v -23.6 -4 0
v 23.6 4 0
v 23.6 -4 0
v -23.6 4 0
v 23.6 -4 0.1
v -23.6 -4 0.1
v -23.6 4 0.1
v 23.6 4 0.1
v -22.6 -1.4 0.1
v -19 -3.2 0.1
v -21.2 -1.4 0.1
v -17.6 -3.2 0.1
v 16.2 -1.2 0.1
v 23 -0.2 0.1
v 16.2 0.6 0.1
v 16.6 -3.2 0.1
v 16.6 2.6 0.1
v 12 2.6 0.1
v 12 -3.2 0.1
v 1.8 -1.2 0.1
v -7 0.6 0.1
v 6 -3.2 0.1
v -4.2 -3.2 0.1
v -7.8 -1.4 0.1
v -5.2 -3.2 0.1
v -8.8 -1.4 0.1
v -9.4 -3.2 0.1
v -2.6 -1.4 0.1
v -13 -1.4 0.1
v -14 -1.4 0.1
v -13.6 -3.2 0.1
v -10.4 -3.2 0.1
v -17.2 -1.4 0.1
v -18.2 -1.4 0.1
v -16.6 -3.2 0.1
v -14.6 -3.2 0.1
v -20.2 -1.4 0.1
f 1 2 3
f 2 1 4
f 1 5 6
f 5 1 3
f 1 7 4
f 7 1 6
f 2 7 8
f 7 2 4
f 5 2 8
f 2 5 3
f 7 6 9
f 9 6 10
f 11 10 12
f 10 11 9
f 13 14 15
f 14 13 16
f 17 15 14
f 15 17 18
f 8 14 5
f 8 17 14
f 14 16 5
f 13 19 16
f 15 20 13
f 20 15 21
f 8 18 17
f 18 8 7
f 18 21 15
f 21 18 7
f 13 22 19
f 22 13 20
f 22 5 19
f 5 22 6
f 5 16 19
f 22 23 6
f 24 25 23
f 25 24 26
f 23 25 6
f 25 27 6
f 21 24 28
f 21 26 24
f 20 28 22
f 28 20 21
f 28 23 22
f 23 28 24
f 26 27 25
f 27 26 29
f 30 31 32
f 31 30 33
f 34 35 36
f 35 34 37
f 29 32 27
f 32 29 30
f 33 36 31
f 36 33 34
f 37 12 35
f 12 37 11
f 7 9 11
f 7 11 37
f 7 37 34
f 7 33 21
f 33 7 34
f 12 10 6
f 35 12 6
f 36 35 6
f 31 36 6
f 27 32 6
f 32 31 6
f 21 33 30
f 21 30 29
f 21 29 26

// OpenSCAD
// file: ../p/box5-12.scad
use <../lib.scad>
function ldraw_lib__box5_12() = [
// 0 Box with 5 Faces without Any Edges
// 0 Name: box5-12.dat
// 0 Author: Chris Dee [cwdee]
// 0 !LDRAW_ORG Primitive UPDATE 2009-02
// 0 !LICENSE Licensed under CC BY 4.0 : see CAreadme.txt
// 
// 0 BFC CERTIFY CCW
  [0,"BFC","CERTIFY"],
  [0,"BFC","CCW"],
// 
// 0 !HISTORY 2009-09-03 [PTadmin] Official Update 2009-02
// 
// 
// 4 16 1 1 1 1 1 -1 -1 1 -1 -1 1 1
  [4,16,1,1,1,1,1,-1,-1,1,-1,-1,1,1],
// 4 16 -1 0 1 1 0 1 1 1 1 -1 1 1
  [4,16,-1,0,1,1,0,1,1,1,1,-1,1,1],
// 4 16 -1 0 -1 -1 0 1 -1 1 1 -1 1 -1
  [4,16,-1,0,-1,-1,0,1,-1,1,1,-1,1,-1],
// 4 16 1 0 -1 -1 0 -1 -1 1 -1 1 1 -1
  [4,16,1,0,-1,-1,0,-1,-1,1,-1,1,1,-1],
// 4 16 1 0 1 1 0 -1 1 1 -1 1 1 1
  [4,16,1,0,1,1,0,-1,1,1,-1,1,1,1],
// 0
];
module ldraw_lib__box5_12(step=0, col=false, unit=2/5, alt=false, line=0.2, solid=!$preview)
    makepoly(ldraw_lib__box5_12(), step=step, col=col, unit=unit, alt=alt, line=line, solid=solid);
ldraw_lib__box5_12(line=0.2);
// main file
use <../lib.scad>
use <../p/box5-12.scad>
function ldraw_lib__4116878a() = [
// 0 Sticker  1 x  5.9 with White Arrow Right on Black Background
// 0 Name: 4116878a.dat
// 0 Author: Gerald Lasser [GeraldLasser]
// 0 !LDRAW_ORG Part UPDATE 2014-02
// 0 !LICENSE Licensed under CC BY 4.0 : see CAreadme.txt
// 
// 0 BFC CERTIFY CCW
  [0,"BFC","CERTIFY"],
  [0,"BFC","CCW"],
// 
// 0 !KEYWORDS Set 4533
// 
// 0 !HISTORY 2014-12-23 [PTadmin] Official Update 2014-02
// 
// 
// 1 16 0 -0.25 0 59 0 0 0 0.25 0 0 0 -10 box5-12.dat
  [1,16,0,-0.25,0,59,0,0,0,0.25,0,0,0,-10, ldraw_lib__box5_12()],
// 3 0 -59 -0.25 10 -59 -0.25 -10 -56.5 -0.25 -3.5
  [3,0,-59,-0.25,10,-59,-0.25,-10,-56.5,-0.25,-3.5],
// 3 0 -56.5 -0.25 -3.5 -59 -0.25 -10 -47.5 -0.25 -8
  [3,0,-56.5,-0.25,-3.5,-59,-0.25,-10,-47.5,-0.25,-8],
// 4 15 -56.5 -0.25 -3.5 -47.5 -0.25 -8 -44 -0.25 -8 -53 -0.25 -3.5
  [4,15,-56.5,-0.25,-3.5,-47.5,-0.25,-8,-44,-0.25,-8,-53,-0.25,-3.5],
// 4 15 40.5 -0.25 -3 41.5 -0.25 -8 57.5 -0.25 -0.5 40.5 -0.25 1.5
  [4,15,40.5,-0.25,-3,41.5,-0.25,-8,57.5,-0.25,-0.5,40.5,-0.25,1.5],
// 4 15 40.5 -0.25 1.5 57.5 -0.25 -0.5 41.5 -0.25 6.5 30 -0.25 6.5
  [4,15,40.5,-0.25,1.5,57.5,-0.25,-0.5,41.5,-0.25,6.5,30,-0.25,6.5],
// 3 0 59 -0.25 10 57.5 -0.25 -0.5 59 -0.25 -10
  [3,0,59,-0.25,10,57.5,-0.25,-0.5,59,-0.25,-10],
// 3 0 59 -0.25 10 41.5 -0.25 6.5 57.5 -0.25 -0.5
  [3,0,59,-0.25,10,41.5,-0.25,6.5,57.5,-0.25,-0.5],
// 3 0 57.5 -0.25 -0.5 41.5 -0.25 -8 59 -0.25 -10
  [3,0,57.5,-0.25,-0.5,41.5,-0.25,-8,59,-0.25,-10],
// 3 15 40.5 -0.25 -3 30 -0.25 -8 41.5 -0.25 -8
  [3,15,40.5,-0.25,-3,30,-0.25,-8,41.5,-0.25,-8],
// 4 15 4.5 -0.25 -3 40.5 -0.25 -3 40.5 -0.25 1.5 -17.5 -0.25 1.5
  [4,15,4.5,-0.25,-3,40.5,-0.25,-3,40.5,-0.25,1.5,-17.5,-0.25,1.5],
// 4 0 30 -0.25 6.5 41.5 -0.25 6.5 59 -0.25 10 -59 -0.25 10
  [4,0,30,-0.25,6.5,41.5,-0.25,6.5,59,-0.25,10,-59,-0.25,10],
// 4 0 30 -0.25 6.5 -59 -0.25 10 -17.5 -0.25 1.5 40.5 -0.25 1.5
  [4,0,30,-0.25,6.5,-59,-0.25,10,-17.5,-0.25,1.5,40.5,-0.25,1.5],
// 4 0 30 -0.25 -8 40.5 -0.25 -3 4.5 -0.25 -3 15 -0.25 -8
  [4,0,30,-0.25,-8,40.5,-0.25,-3,4.5,-0.25,-3,15,-0.25,-8],
// 4 0 59 -0.25 -10 30 -0.25 -8 15 -0.25 -8 -59 -0.25 -10
  [4,0,59,-0.25,-10,30,-0.25,-8,15,-0.25,-8,-59,-0.25,-10],
// 3 0 59 -0.25 -10 41.5 -0.25 -8 30 -0.25 -8
  [3,0,59,-0.25,-10,41.5,-0.25,-8,30,-0.25,-8],
// 3 0 15 -0.25 -8 -10.5 -0.25 -8 -59 -0.25 -10
  [3,0,15,-0.25,-8,-10.5,-0.25,-8,-59,-0.25,-10],
// 4 0 -13 -0.25 -8 -10.5 -0.25 -8 -19.5 -0.25 -3.5 -22 -0.25 -3.5
  [4,0,-13,-0.25,-8,-10.5,-0.25,-8,-19.5,-0.25,-3.5,-22,-0.25,-3.5],
// 3 0 -10.5 -0.25 -8 -13 -0.25 -8 -59 -0.25 -10
  [3,0,-10.5,-0.25,-8,-13,-0.25,-8,-59,-0.25,-10],
// 3 0 -13 -0.25 -8 -23.5 -0.25 -8 -59 -0.25 -10
  [3,0,-13,-0.25,-8,-23.5,-0.25,-8,-59,-0.25,-10],
// 3 0 -17.5 -0.25 1.5 -19.5 -0.25 -3.5 -6.5 -0.25 -3.5
  [3,0,-17.5,-0.25,1.5,-19.5,-0.25,-3.5,-6.5,-0.25,-3.5],
// 3 0 -17.5 -0.25 1.5 -22 -0.25 -3.5 -19.5 -0.25 -3.5
  [3,0,-17.5,-0.25,1.5,-22,-0.25,-3.5,-19.5,-0.25,-3.5],
// 4 15 4.5 -0.25 -3 -17.5 -0.25 1.5 -6.5 -0.25 -3.5 15 -0.25 -8
  [4,15,4.5,-0.25,-3,-17.5,-0.25,1.5,-6.5,-0.25,-3.5,15,-0.25,-8],
// 4 15 -6.5 -0.25 -3.5 -19.5 -0.25 -3.5 -10.5 -0.25 -8 15 -0.25 -8
  [4,15,-6.5,-0.25,-3.5,-19.5,-0.25,-3.5,-10.5,-0.25,-8,15,-0.25,-8],
// 4 15 -23.5 -0.25 -8 -13 -0.25 -8 -22 -0.25 -3.5 -32.5 -0.25 -3.5
  [4,15,-23.5,-0.25,-8,-13,-0.25,-8,-22,-0.25,-3.5,-32.5,-0.25,-3.5],
// 4 15 -34 -0.25 -8 -26 -0.25 -8 -35 -0.25 -3.5 -43 -0.25 -3.5
  [4,15,-34,-0.25,-8,-26,-0.25,-8,-35,-0.25,-3.5,-43,-0.25,-3.5],
// 4 15 -41.5 -0.25 -8 -36.5 -0.25 -8 -45.5 -0.25 -3.5 -50.5 -0.25 -3.5
  [4,15,-41.5,-0.25,-8,-36.5,-0.25,-8,-45.5,-0.25,-3.5,-50.5,-0.25,-3.5],
// 4 0 -35 -0.25 -3.5 -26 -0.25 -8 -23.5 -0.25 -8 -32.5 -0.25 -3.5
  [4,0,-35,-0.25,-3.5,-26,-0.25,-8,-23.5,-0.25,-8,-32.5,-0.25,-3.5],
// 4 0 -45.5 -0.25 -3.5 -36.5 -0.25 -8 -34 -0.25 -8 -43 -0.25 -3.5
  [4,0,-45.5,-0.25,-3.5,-36.5,-0.25,-8,-34,-0.25,-8,-43,-0.25,-3.5],
// 4 0 -53 -0.25 -3.5 -44 -0.25 -8 -41.5 -0.25 -8 -50.5 -0.25 -3.5
  [4,0,-53,-0.25,-3.5,-44,-0.25,-8,-41.5,-0.25,-8,-50.5,-0.25,-3.5],
// 3 0 -59 -0.25 10 -56.5 -0.25 -3.5 -53 -0.25 -3.5
  [3,0,-59,-0.25,10,-56.5,-0.25,-3.5,-53,-0.25,-3.5],
// 3 0 -59 -0.25 10 -53 -0.25 -3.5 -50.5 -0.25 -3.5
  [3,0,-59,-0.25,10,-53,-0.25,-3.5,-50.5,-0.25,-3.5],
// 3 0 -59 -0.25 10 -50.5 -0.25 -3.5 -45.5 -0.25 -3.5
  [3,0,-59,-0.25,10,-50.5,-0.25,-3.5,-45.5,-0.25,-3.5],
// 4 0 -59 -0.25 10 -45.5 -0.25 -3.5 -43 -0.25 -3.5 -17.5 -0.25 1.5
  [4,0,-59,-0.25,10,-45.5,-0.25,-3.5,-43,-0.25,-3.5,-17.5,-0.25,1.5],
// 3 0 -44 -0.25 -8 -47.5 -0.25 -8 -59 -0.25 -10
  [3,0,-44,-0.25,-8,-47.5,-0.25,-8,-59,-0.25,-10],
// 3 0 -41.5 -0.25 -8 -44 -0.25 -8 -59 -0.25 -10
  [3,0,-41.5,-0.25,-8,-44,-0.25,-8,-59,-0.25,-10],
// 3 0 -36.5 -0.25 -8 -41.5 -0.25 -8 -59 -0.25 -10
  [3,0,-36.5,-0.25,-8,-41.5,-0.25,-8,-59,-0.25,-10],
// 3 0 -34 -0.25 -8 -36.5 -0.25 -8 -59 -0.25 -10
  [3,0,-34,-0.25,-8,-36.5,-0.25,-8,-59,-0.25,-10],
// 3 0 -23.5 -0.25 -8 -26 -0.25 -8 -59 -0.25 -10
  [3,0,-23.5,-0.25,-8,-26,-0.25,-8,-59,-0.25,-10],
// 3 0 -26 -0.25 -8 -34 -0.25 -8 -59 -0.25 -10
  [3,0,-26,-0.25,-8,-34,-0.25,-8,-59,-0.25,-10],
// 3 0 -17.5 -0.25 1.5 -43 -0.25 -3.5 -35 -0.25 -3.5
  [3,0,-17.5,-0.25,1.5,-43,-0.25,-3.5,-35,-0.25,-3.5],
// 3 0 -17.5 -0.25 1.5 -35 -0.25 -3.5 -32.5 -0.25 -3.5
  [3,0,-17.5,-0.25,1.5,-35,-0.25,-3.5,-32.5,-0.25,-3.5],
// 3 0 -17.5 -0.25 1.5 -32.5 -0.25 -3.5 -22 -0.25 -3.5
  [3,0,-17.5,-0.25,1.5,-32.5,-0.25,-3.5,-22,-0.25,-3.5],
];
module ldraw_lib__4116878a(step=0, col=false, unit=2/5, alt=false, line=0.2, solid=!$preview)
    makepoly(ldraw_lib__4116878a(), step=step, col=col, unit=unit, alt=alt, line=line, solid=solid);
ldraw_lib__4116878a(line=0.2);
